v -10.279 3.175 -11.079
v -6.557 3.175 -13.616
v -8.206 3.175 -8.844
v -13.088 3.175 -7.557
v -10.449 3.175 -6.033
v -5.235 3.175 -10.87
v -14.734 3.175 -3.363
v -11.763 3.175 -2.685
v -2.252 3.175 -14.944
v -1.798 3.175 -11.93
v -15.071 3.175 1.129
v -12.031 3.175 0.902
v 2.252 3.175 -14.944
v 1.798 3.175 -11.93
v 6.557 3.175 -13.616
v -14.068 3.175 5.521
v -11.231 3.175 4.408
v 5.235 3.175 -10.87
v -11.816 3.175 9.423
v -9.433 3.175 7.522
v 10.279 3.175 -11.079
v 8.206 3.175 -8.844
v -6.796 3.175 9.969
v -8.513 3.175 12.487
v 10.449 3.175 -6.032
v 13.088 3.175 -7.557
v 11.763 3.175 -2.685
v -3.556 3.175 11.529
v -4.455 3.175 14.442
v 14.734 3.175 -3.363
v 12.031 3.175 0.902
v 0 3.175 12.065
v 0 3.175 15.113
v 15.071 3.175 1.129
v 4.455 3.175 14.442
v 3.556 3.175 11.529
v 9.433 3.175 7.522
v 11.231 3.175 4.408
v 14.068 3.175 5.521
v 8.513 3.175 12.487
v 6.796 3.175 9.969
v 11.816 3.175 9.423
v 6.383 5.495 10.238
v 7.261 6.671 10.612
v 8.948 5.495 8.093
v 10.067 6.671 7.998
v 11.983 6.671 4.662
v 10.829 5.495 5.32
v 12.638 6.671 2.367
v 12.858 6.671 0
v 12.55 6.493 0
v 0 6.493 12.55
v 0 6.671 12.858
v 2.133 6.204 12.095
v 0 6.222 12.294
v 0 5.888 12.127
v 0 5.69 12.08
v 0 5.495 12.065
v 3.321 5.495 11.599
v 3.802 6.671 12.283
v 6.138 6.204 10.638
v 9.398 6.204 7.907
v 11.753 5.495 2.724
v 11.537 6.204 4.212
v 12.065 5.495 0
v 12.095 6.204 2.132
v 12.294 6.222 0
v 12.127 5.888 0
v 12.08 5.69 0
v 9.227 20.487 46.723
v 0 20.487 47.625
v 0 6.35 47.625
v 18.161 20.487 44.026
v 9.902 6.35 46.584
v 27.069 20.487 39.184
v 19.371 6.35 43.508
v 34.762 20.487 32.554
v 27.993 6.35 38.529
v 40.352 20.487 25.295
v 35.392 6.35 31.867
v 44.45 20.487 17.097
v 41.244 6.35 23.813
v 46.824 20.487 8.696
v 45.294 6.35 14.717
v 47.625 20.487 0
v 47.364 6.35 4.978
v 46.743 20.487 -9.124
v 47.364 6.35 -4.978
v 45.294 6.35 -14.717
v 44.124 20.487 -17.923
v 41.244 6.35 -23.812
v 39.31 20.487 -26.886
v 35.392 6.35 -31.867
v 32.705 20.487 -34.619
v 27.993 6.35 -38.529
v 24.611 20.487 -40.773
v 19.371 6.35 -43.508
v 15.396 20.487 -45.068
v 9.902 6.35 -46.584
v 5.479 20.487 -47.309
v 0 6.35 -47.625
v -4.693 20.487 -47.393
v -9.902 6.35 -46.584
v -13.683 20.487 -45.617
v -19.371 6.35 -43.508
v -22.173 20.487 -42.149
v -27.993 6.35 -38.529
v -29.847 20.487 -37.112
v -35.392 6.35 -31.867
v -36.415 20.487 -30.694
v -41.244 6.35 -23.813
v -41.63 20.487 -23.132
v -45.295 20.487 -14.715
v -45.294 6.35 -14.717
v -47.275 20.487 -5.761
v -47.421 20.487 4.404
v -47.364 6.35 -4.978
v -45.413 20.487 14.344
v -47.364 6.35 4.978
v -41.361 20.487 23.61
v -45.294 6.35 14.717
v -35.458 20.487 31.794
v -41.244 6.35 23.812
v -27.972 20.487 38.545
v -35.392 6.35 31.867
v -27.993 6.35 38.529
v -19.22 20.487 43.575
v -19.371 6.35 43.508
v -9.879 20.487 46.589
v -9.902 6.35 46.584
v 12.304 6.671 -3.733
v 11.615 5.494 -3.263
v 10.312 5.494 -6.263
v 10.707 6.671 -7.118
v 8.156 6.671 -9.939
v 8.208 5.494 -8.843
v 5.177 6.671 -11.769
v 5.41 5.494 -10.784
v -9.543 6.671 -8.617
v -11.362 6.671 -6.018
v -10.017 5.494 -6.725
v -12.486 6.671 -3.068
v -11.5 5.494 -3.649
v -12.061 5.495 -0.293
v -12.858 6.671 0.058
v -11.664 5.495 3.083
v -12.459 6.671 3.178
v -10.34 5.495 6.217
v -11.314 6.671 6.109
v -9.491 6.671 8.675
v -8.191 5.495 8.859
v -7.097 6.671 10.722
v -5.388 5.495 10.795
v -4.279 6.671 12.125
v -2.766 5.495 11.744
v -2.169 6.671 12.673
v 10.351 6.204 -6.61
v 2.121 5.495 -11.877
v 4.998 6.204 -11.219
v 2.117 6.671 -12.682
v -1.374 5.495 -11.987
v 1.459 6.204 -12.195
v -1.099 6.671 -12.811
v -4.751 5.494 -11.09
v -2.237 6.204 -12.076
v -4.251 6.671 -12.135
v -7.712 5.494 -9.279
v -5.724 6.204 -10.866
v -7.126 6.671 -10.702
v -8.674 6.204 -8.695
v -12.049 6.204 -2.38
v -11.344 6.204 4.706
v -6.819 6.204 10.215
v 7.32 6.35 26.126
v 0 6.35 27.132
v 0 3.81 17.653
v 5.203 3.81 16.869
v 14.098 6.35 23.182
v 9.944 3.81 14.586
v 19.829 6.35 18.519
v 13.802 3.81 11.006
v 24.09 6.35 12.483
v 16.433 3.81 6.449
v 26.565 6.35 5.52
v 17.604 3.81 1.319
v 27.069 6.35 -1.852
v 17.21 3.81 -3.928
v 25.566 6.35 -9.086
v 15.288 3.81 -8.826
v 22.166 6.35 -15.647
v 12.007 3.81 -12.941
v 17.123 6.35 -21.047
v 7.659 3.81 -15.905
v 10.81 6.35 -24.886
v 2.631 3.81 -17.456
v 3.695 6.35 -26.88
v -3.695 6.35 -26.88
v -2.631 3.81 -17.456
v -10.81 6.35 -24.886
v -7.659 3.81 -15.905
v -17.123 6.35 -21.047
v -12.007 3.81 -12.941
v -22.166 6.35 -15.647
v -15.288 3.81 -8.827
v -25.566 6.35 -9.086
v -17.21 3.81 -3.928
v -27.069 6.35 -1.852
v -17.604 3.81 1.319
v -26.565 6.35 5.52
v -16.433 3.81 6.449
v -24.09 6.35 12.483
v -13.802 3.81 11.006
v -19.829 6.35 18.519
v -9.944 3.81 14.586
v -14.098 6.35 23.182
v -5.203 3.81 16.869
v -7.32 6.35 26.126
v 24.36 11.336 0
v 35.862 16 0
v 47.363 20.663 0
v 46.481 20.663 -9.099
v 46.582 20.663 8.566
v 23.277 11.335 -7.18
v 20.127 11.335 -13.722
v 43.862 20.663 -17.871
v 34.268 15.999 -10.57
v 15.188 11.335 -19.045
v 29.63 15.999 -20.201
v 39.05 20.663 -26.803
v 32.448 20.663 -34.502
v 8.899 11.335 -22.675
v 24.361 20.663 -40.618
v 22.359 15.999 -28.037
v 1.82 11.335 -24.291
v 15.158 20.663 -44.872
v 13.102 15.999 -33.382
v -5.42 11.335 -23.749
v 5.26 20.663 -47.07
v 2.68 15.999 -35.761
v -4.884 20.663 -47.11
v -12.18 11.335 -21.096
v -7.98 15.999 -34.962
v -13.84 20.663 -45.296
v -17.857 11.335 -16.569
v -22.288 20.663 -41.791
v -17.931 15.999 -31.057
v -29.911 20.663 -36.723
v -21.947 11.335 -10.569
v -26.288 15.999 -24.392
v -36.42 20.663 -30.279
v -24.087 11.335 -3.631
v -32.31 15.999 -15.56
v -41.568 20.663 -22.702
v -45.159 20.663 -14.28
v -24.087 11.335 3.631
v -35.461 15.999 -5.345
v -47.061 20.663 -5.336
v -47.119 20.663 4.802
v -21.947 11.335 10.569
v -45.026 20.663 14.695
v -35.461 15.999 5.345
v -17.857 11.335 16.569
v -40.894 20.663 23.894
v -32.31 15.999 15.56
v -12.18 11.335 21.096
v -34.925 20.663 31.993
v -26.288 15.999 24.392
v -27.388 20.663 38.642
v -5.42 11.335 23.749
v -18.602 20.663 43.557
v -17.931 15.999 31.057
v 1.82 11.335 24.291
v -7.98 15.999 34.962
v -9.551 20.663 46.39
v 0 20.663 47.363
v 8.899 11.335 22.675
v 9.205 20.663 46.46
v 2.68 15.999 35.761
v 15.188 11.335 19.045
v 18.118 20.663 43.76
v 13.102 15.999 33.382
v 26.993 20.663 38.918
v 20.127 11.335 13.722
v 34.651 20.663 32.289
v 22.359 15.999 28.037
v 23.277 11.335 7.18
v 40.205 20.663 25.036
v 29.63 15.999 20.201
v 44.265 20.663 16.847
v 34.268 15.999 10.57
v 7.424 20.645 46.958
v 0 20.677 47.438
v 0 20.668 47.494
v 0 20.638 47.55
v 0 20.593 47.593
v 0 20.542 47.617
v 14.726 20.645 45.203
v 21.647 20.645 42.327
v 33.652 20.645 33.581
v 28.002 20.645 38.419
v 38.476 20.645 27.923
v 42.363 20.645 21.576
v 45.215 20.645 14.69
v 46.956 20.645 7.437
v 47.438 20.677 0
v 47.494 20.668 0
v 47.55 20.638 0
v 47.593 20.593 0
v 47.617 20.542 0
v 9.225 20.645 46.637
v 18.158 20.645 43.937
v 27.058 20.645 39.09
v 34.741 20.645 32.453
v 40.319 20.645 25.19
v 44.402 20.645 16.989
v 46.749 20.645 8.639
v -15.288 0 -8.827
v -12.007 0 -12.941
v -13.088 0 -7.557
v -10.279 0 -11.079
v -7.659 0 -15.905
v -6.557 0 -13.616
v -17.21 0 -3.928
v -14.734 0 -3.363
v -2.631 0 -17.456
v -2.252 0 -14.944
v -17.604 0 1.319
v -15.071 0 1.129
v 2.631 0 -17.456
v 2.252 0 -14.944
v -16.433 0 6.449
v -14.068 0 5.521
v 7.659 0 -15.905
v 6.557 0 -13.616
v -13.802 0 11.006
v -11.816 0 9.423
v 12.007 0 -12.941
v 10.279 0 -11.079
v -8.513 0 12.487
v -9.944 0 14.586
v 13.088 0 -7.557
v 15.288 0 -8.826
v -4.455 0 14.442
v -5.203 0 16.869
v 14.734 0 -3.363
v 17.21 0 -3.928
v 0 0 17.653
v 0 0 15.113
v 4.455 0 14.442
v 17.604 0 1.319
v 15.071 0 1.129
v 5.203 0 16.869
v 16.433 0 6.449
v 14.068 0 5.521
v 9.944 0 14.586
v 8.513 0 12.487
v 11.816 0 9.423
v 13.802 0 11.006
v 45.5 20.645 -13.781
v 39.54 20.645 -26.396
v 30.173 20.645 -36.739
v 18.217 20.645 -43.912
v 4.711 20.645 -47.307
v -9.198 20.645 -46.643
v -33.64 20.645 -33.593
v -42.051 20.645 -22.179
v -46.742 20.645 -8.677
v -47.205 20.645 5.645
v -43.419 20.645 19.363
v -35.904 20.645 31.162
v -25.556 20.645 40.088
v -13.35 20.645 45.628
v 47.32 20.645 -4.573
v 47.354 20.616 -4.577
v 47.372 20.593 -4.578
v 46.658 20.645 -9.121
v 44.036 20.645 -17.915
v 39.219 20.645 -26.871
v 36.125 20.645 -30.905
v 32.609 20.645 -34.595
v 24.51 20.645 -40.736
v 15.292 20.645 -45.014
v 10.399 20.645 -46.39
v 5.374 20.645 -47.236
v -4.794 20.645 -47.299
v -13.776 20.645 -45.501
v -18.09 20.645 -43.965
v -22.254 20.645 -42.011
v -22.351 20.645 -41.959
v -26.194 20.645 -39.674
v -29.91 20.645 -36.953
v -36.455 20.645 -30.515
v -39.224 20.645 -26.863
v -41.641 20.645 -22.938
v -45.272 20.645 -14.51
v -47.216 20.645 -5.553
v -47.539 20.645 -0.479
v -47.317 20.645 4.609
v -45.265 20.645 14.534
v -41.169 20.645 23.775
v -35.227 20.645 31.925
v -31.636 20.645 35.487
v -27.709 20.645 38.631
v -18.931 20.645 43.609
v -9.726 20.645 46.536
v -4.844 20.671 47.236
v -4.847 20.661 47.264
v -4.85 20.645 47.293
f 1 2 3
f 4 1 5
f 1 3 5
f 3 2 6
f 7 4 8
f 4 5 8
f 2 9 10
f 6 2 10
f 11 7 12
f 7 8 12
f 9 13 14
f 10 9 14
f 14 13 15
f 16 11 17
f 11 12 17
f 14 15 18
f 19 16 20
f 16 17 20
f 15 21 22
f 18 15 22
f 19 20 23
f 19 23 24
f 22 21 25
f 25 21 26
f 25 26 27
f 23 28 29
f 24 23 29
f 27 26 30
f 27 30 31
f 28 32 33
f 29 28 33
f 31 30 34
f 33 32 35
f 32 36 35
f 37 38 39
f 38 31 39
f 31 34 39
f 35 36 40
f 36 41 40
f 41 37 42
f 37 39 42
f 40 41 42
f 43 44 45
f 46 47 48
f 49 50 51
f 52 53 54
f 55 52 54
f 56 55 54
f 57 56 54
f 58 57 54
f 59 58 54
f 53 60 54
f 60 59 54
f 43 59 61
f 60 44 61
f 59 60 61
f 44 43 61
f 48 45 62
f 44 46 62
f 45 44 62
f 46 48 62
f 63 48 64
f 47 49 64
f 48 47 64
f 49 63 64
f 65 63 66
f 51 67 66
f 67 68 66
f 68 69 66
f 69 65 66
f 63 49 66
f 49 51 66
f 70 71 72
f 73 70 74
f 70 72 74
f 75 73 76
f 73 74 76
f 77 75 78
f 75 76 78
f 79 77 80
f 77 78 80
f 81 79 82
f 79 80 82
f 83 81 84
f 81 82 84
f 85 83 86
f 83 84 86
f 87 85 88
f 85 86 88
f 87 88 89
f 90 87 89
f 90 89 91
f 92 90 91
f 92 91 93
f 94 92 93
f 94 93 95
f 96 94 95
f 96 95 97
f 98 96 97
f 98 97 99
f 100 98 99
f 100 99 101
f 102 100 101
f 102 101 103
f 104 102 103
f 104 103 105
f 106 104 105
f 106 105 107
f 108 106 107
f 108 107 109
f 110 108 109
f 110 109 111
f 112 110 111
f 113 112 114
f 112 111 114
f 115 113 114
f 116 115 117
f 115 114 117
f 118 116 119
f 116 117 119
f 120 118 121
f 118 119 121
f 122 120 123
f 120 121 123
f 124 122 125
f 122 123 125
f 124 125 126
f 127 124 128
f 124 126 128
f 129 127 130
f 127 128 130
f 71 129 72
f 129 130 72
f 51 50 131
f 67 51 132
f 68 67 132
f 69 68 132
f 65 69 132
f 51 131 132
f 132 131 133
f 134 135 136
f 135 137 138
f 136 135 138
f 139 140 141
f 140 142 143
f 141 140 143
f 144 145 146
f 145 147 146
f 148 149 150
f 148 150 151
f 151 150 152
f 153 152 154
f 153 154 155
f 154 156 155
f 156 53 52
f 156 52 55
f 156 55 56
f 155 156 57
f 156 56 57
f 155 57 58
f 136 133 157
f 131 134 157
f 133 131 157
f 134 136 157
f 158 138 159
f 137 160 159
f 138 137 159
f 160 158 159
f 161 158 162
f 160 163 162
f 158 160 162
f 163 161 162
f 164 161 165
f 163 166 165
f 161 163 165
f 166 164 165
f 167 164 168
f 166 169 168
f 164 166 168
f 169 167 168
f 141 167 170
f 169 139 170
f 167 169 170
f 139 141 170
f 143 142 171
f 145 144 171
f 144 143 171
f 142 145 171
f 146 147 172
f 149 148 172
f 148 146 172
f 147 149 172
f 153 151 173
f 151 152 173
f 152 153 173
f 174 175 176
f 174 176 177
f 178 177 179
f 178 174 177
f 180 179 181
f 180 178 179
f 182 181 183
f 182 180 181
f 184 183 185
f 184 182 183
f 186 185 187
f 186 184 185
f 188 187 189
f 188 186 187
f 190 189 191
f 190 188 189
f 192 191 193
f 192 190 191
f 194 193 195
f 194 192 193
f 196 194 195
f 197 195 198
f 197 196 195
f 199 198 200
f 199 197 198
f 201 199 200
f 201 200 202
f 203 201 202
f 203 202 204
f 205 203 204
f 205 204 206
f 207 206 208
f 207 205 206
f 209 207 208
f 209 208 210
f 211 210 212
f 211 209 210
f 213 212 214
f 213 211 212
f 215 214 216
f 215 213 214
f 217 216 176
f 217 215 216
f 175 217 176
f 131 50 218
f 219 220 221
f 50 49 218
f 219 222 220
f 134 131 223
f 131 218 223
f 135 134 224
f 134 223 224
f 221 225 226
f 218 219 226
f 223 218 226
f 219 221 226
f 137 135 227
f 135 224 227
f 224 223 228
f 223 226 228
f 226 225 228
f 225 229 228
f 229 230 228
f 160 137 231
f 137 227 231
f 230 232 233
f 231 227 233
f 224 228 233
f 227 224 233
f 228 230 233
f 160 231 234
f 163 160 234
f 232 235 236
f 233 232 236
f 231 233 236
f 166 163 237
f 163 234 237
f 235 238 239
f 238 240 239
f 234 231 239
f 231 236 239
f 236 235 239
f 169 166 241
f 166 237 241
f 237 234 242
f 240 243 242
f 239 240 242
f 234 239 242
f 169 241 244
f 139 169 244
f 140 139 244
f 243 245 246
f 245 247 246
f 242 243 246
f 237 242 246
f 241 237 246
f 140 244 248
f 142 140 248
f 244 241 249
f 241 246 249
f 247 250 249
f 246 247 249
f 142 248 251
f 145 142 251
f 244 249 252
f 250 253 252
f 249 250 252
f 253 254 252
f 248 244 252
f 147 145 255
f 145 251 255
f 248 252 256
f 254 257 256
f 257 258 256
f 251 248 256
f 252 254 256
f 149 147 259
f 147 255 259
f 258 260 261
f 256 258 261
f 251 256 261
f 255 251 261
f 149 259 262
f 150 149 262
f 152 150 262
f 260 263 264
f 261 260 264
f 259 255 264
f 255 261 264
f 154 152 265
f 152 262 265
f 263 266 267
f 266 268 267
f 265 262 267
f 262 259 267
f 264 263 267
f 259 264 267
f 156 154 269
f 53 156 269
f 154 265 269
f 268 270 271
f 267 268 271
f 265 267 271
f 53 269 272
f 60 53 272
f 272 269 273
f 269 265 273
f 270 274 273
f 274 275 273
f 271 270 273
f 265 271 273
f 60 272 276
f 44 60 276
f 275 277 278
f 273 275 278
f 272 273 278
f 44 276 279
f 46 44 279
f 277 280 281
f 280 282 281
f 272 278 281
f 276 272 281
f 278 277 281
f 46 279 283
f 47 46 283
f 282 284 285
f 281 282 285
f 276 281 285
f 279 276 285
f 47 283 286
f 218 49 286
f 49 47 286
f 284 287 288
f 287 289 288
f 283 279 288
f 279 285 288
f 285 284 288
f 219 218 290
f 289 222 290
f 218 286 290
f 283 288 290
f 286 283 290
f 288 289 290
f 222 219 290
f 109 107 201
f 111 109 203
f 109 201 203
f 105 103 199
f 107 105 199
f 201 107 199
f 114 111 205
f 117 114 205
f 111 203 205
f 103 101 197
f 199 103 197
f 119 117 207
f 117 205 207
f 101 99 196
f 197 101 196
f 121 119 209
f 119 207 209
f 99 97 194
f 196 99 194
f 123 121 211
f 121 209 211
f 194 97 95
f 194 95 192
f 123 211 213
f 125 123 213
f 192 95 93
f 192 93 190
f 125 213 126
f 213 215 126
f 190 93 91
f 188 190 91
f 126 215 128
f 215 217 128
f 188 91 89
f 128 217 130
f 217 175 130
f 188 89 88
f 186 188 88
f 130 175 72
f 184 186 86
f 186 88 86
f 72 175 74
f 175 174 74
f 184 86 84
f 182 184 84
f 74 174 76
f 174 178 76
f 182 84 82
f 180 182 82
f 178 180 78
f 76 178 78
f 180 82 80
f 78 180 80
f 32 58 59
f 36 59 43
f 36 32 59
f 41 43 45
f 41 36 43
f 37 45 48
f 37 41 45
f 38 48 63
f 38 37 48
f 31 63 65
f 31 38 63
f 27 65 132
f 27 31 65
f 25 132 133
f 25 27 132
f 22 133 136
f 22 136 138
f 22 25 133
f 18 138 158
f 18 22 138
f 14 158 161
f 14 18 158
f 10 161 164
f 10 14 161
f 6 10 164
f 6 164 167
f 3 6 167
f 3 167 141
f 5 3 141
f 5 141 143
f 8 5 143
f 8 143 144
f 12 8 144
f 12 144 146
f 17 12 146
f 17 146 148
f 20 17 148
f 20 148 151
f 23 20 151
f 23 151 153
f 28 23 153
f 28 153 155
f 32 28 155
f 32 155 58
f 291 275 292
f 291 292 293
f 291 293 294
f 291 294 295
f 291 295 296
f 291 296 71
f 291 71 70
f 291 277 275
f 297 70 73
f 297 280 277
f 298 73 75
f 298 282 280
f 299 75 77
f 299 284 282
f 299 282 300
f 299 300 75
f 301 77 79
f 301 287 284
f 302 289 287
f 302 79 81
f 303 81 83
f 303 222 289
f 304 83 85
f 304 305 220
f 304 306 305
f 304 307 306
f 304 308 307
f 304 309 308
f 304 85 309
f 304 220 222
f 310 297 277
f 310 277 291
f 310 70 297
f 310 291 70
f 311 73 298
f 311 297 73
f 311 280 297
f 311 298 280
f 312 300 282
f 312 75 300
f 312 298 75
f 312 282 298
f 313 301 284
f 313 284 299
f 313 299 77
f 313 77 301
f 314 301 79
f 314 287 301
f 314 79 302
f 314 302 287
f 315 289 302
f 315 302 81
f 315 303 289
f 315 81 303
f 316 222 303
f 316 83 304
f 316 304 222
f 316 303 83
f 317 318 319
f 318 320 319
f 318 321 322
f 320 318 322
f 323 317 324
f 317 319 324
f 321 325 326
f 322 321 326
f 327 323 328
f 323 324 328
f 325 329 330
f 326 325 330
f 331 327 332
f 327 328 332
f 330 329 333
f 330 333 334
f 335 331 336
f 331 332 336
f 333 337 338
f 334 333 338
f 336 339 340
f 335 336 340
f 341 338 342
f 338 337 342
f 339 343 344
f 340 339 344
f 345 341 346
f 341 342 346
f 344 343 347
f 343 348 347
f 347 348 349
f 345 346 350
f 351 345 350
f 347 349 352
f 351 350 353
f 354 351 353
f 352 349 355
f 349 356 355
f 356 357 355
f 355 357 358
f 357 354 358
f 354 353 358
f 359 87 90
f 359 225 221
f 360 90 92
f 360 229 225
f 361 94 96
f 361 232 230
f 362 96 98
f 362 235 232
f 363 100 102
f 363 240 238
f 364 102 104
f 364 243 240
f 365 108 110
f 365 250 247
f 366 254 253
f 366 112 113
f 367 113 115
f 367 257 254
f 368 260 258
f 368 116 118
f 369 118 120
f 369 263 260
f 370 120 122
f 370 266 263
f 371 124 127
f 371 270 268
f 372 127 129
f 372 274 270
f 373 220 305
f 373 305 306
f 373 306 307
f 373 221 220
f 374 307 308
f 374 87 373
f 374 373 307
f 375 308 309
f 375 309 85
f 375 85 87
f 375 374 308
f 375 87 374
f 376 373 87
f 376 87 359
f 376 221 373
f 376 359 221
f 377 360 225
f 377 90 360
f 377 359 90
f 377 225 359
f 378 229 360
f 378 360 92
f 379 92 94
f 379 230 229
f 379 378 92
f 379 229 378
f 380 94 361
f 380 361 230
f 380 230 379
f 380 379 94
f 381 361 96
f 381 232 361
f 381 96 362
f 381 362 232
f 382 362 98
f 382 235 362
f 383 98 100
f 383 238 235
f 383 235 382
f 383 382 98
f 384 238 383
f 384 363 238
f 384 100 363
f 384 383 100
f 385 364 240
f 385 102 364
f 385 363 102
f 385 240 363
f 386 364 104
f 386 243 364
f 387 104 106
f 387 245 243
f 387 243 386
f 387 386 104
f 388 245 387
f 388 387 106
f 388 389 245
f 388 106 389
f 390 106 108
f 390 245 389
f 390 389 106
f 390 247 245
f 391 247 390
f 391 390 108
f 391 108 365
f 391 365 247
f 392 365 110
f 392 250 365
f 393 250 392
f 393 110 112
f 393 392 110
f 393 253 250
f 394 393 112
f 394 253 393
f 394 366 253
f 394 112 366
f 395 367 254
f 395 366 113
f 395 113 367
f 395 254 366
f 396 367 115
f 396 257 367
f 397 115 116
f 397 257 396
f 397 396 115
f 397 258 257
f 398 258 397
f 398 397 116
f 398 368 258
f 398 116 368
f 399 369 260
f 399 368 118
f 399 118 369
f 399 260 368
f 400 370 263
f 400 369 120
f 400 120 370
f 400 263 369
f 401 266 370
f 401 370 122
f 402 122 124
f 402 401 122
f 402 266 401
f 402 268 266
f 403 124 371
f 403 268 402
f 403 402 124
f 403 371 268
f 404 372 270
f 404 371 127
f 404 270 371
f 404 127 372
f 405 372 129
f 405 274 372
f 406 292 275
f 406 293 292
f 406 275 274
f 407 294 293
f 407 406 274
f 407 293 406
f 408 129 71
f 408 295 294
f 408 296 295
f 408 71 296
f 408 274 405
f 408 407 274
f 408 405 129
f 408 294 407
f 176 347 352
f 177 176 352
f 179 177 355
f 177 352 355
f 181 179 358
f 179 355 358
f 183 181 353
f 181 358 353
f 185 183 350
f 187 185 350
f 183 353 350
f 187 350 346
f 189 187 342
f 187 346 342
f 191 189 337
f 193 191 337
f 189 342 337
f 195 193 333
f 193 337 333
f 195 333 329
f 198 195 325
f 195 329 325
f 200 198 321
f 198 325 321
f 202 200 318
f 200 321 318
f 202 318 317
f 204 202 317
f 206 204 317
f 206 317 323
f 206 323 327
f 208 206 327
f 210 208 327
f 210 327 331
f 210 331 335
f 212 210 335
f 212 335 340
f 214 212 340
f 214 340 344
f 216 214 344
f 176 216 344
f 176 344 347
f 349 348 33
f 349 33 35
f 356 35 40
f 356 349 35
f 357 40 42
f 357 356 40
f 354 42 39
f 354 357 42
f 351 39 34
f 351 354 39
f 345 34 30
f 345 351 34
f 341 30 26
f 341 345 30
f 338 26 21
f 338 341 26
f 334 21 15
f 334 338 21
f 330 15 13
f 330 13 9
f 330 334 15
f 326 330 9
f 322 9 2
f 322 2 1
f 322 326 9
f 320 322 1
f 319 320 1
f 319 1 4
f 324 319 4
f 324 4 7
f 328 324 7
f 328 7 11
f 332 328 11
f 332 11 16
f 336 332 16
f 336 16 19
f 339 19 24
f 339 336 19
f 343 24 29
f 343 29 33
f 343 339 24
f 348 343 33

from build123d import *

# Parameters (mm, degrees)
SKETCH1_R           = 17.653
SKETCH1_R_2         = 15.113
BOSS_EXTRUDE1_DEPTH = 3.175
SKETCH2_R           = 17.653
SKETCH2_R_2         = 12.065
BOSS_EXTRUDE2_DEPTH = 3.175
SKETCH7_R           = 47.625
BOSS_EXTRUDE3_DEPTH = 14.41963842
SKETCH3_R           = 12.065
CHAMFER1_SIZE       = 2.54
CHAMFER1_SIZE2      = 9.479409051
FILLET6_R           = 1.27
FILLET7_R           = 0.1905


with BuildPart() as part:
    # Sketch1 → Boss-Extrude1 (new body)
    with BuildSketch(Plane(origin=(0, 0, 0), x_dir=(1, 0, 0), z_dir=(0, 1, 0))):
        Circle(SKETCH1_R)
        Circle(SKETCH1_R_2, mode=Mode.SUBTRACT)
    extrude(amount=BOSS_EXTRUDE1_DEPTH)

    # Sketch2 → Boss-Extrude2 (add)
    with BuildSketch(Plane(origin=(0, 3.175, 0), x_dir=(1, 0, 0), z_dir=(0, 1, 0))):
        Circle(SKETCH2_R)
        Circle(SKETCH2_R_2, mode=Mode.SUBTRACT)
    extrude(amount=BOSS_EXTRUDE2_DEPTH)

    # Sketch7 → Boss-Extrude3 (add)
    with BuildSketch(Plane(origin=(0, 6.35, 0), x_dir=(1, 0, 0), z_dir=(0, 1, 0))):
        Circle(SKETCH7_R)
    extrude(amount=BOSS_EXTRUDE3_DEPTH)

    # Sketch3 → section 0 of cut_loft1
    with BuildSketch(Plane(origin=(0, 6.35, 0), x_dir=(1, 0, 0), z_dir=(0, 1, 0)), mode=Mode.PRIVATE) as cut_loft1_s0:
        Circle(SKETCH3_R)
    # loft up to a face of the part (cut_loft1)
    loft([cut_loft1_s0.sketch, part.faces().sort_by_distance((0, 20.76963842, 0))[0]], mode=Mode.SUBTRACT)

    # Chamfer1
    chamfer1_edges = [part.edges().sort_by_distance(p)[0] for p in [
        (-17.653, 6.35, 0),
    ]]
    chamfer1_side = [part.faces().sort_by_distance(p)[0] for p in [
        (-17.653, 3.175, 0),
    ]]
    chamfer(chamfer1_edges, length=CHAMFER1_SIZE, length2=CHAMFER1_SIZE2, reference=chamfer1_side[0])

    # Fillet6
    fillet6_edges = [part.edges().sort_by_distance(p)[0] for p in [
        (-12.065, 6.35, 0),
    ]]
    fillet(fillet6_edges, radius=FILLET6_R)

    # Fillet7
    fillet7_edges = [part.edges().sort_by_distance(p)[0] for p in [
        (-47.625, 20.76963842, 0),
    ]]
    fillet(fillet7_edges, radius=FILLET7_R)


solid = part.part
